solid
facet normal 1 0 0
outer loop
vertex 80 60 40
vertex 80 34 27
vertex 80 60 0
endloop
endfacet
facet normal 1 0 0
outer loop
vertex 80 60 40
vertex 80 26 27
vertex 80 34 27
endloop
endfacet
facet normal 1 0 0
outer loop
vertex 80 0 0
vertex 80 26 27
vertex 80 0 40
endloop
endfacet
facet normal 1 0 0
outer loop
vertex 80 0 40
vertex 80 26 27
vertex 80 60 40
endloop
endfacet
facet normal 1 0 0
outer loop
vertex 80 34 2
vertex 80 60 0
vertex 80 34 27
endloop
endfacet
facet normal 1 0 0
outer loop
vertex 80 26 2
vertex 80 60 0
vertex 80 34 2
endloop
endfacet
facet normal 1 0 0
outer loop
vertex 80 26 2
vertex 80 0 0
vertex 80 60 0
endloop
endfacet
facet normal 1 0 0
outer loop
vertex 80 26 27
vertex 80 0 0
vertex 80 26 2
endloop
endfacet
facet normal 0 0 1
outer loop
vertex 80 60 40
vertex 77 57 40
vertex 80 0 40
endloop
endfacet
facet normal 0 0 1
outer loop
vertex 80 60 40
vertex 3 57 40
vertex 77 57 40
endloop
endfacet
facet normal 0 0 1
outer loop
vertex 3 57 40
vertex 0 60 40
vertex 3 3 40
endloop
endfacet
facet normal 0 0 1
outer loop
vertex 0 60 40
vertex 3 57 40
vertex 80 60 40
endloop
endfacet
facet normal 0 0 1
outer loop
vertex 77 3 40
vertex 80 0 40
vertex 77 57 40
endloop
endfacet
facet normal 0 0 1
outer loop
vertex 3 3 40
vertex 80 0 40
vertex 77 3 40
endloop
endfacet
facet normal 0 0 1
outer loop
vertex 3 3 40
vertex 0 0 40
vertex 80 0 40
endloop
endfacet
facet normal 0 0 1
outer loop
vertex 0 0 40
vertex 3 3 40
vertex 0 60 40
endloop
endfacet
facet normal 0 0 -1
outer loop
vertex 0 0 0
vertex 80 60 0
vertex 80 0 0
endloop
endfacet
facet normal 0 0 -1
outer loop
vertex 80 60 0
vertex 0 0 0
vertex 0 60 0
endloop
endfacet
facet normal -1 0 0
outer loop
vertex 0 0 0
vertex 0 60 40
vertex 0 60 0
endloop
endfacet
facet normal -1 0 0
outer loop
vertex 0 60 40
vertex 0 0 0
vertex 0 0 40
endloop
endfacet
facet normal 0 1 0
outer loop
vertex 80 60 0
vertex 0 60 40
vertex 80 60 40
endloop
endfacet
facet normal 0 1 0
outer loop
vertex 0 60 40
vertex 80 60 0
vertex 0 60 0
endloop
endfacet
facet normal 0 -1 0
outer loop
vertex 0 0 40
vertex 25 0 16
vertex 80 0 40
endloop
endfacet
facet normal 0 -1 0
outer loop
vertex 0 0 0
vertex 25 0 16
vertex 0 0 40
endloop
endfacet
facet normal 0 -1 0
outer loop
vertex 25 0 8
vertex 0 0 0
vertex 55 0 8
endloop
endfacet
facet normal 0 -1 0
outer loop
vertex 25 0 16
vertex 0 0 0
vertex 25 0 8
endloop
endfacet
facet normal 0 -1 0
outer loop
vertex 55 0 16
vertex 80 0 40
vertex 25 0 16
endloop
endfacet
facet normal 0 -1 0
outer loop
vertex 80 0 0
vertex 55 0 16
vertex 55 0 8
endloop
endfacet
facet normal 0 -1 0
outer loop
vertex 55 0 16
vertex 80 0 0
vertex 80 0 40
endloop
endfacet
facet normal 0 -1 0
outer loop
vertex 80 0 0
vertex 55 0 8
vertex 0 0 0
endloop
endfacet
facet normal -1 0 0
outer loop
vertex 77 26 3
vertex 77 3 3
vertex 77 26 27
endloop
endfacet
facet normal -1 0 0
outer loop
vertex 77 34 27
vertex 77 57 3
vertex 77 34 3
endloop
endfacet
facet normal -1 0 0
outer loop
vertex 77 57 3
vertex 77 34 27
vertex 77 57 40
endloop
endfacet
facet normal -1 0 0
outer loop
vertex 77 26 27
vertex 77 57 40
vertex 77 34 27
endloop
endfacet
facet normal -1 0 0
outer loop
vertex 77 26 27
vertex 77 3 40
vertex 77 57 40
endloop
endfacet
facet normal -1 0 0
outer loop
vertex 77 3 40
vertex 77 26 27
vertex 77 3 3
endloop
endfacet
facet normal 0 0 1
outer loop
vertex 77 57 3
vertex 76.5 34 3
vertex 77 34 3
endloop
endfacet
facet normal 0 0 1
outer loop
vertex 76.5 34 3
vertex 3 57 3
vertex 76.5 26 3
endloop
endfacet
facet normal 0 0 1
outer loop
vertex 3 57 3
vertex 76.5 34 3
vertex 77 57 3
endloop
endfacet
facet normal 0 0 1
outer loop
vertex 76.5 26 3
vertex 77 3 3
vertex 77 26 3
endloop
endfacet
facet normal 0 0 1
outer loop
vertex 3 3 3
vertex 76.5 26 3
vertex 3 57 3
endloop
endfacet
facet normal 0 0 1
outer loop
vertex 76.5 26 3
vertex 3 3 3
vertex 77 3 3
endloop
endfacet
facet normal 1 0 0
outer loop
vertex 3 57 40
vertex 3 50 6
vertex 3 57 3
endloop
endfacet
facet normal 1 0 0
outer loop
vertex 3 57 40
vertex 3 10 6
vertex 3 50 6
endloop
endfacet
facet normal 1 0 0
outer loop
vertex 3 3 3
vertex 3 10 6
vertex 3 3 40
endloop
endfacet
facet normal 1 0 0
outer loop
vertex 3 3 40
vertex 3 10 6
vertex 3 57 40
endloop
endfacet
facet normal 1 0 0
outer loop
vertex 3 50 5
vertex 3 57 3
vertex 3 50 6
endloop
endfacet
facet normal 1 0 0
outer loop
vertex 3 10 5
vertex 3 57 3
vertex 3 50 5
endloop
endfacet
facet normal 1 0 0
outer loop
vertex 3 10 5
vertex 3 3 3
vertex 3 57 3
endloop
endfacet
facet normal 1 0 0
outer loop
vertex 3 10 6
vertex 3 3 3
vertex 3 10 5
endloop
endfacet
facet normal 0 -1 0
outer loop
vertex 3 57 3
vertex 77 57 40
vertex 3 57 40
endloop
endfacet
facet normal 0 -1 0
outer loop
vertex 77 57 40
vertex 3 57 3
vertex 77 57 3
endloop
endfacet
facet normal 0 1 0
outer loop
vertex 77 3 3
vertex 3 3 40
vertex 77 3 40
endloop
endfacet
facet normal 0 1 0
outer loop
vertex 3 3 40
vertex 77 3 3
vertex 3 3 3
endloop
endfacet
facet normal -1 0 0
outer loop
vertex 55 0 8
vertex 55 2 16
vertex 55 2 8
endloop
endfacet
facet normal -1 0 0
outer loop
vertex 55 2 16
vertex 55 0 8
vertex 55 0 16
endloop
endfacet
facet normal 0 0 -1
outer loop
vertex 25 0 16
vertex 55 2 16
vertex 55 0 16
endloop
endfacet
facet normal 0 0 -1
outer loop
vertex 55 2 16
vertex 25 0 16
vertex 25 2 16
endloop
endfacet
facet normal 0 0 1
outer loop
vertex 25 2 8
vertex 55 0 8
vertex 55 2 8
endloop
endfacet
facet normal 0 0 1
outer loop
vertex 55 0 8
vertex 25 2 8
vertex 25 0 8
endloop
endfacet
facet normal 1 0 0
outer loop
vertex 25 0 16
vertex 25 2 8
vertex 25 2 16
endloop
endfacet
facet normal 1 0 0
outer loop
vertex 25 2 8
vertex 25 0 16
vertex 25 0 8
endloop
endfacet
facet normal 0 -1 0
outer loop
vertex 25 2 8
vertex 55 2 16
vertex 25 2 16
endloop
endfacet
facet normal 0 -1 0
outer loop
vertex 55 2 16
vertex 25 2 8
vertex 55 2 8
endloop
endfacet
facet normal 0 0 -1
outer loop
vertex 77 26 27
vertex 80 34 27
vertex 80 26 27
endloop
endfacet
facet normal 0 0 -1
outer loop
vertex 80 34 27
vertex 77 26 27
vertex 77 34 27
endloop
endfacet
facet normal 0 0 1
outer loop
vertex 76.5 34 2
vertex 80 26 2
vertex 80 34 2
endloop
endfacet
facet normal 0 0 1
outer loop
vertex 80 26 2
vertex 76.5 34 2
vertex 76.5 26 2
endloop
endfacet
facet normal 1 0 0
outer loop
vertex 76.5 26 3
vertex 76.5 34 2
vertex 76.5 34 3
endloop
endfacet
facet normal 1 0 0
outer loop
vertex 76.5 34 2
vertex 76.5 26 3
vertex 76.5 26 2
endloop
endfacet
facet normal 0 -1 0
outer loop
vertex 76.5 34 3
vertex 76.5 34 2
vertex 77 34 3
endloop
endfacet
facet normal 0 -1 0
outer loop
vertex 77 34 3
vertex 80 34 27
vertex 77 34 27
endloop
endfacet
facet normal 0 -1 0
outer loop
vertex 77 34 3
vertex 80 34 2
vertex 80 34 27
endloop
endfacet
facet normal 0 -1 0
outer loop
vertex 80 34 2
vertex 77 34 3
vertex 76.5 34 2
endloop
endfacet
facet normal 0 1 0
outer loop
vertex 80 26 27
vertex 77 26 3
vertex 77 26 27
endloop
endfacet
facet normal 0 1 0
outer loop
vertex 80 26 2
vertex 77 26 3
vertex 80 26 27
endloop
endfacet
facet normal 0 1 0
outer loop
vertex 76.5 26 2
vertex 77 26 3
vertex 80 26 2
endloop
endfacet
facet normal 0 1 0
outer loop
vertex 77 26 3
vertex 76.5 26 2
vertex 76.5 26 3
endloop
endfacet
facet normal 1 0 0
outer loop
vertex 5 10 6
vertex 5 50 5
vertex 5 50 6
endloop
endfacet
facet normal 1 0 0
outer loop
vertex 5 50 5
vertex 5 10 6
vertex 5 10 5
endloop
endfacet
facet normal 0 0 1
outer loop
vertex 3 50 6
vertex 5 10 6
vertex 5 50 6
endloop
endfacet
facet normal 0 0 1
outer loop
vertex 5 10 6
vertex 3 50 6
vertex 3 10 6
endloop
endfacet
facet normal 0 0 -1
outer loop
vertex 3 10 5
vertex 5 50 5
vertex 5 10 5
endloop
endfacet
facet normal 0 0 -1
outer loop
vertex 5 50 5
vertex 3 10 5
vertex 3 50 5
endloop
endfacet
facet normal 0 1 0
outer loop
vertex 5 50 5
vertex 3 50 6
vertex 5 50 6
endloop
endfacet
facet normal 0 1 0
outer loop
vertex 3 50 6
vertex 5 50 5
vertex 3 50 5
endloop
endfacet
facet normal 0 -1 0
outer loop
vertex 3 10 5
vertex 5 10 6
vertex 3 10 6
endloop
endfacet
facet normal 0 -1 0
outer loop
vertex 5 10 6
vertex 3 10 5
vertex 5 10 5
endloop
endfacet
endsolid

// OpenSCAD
// Parametric Enclosure with Open Top, Side Cutouts, and Interior Ledge
// All dimensions in millimeters

// --- Main Envelope ---
width = 80;
depth = 60;
height = 40;

// --- Wall and Floor Thickness ---
wall_thick = 3;
floor_thick = 3;

// --- Front Face Horizontal Recess (blind pocket) ---
ho_width = 30;      // horizontal span
ho_height = 8;      // vertical span
ho_elev = 8;        // bottom edge above base
ho_depth = 2;       // depth into wall (blind recess)

// --- Right Face Vertical Through Opening ---
vo_width = 8;       // span along Y
vo_height = 25;     // span along Z
vo_elev = 2;        // bottom edge above base

// --- Interior Shelf-Like Rib on Left Wall ---
ledge_length = 40;      // span along Y
ledge_protrusion = 2;   // how far it extends into the cavity
ledge_thick = 1;        // vertical thickness
ledge_elev = 2;         // height above interior floor

$fn = 50;

// Main solid body with hollow interior and side features removed
difference() {
    // Outer rectangular block
    cube([width, depth, height]);

    // Hollow interior (open top)
    translate([wall_thick, wall_thick, floor_thick])
        cube([width - 2*wall_thick, depth - 2*wall_thick, height - floor_thick + 0.5]);

    // Front face centered horizontal recess (blind cut)
    translate([(width - ho_width)/2, -0.5, ho_elev])
        cube([ho_width, ho_depth + 0.5, ho_height]);

    // Right face centered vertical through opening
    translate([width - wall_thick - 0.5, (depth - vo_width)/2, vo_elev])
        cube([wall_thick + 1, vo_width, vo_height]);
}

// Interior ledge on left wall (added after hollowing to create internal step)
translate([wall_thick - 0.01, (depth - ledge_length)/2, floor_thick + ledge_elev])
    cube([ledge_protrusion + 0.01, ledge_length, ledge_thick]);
